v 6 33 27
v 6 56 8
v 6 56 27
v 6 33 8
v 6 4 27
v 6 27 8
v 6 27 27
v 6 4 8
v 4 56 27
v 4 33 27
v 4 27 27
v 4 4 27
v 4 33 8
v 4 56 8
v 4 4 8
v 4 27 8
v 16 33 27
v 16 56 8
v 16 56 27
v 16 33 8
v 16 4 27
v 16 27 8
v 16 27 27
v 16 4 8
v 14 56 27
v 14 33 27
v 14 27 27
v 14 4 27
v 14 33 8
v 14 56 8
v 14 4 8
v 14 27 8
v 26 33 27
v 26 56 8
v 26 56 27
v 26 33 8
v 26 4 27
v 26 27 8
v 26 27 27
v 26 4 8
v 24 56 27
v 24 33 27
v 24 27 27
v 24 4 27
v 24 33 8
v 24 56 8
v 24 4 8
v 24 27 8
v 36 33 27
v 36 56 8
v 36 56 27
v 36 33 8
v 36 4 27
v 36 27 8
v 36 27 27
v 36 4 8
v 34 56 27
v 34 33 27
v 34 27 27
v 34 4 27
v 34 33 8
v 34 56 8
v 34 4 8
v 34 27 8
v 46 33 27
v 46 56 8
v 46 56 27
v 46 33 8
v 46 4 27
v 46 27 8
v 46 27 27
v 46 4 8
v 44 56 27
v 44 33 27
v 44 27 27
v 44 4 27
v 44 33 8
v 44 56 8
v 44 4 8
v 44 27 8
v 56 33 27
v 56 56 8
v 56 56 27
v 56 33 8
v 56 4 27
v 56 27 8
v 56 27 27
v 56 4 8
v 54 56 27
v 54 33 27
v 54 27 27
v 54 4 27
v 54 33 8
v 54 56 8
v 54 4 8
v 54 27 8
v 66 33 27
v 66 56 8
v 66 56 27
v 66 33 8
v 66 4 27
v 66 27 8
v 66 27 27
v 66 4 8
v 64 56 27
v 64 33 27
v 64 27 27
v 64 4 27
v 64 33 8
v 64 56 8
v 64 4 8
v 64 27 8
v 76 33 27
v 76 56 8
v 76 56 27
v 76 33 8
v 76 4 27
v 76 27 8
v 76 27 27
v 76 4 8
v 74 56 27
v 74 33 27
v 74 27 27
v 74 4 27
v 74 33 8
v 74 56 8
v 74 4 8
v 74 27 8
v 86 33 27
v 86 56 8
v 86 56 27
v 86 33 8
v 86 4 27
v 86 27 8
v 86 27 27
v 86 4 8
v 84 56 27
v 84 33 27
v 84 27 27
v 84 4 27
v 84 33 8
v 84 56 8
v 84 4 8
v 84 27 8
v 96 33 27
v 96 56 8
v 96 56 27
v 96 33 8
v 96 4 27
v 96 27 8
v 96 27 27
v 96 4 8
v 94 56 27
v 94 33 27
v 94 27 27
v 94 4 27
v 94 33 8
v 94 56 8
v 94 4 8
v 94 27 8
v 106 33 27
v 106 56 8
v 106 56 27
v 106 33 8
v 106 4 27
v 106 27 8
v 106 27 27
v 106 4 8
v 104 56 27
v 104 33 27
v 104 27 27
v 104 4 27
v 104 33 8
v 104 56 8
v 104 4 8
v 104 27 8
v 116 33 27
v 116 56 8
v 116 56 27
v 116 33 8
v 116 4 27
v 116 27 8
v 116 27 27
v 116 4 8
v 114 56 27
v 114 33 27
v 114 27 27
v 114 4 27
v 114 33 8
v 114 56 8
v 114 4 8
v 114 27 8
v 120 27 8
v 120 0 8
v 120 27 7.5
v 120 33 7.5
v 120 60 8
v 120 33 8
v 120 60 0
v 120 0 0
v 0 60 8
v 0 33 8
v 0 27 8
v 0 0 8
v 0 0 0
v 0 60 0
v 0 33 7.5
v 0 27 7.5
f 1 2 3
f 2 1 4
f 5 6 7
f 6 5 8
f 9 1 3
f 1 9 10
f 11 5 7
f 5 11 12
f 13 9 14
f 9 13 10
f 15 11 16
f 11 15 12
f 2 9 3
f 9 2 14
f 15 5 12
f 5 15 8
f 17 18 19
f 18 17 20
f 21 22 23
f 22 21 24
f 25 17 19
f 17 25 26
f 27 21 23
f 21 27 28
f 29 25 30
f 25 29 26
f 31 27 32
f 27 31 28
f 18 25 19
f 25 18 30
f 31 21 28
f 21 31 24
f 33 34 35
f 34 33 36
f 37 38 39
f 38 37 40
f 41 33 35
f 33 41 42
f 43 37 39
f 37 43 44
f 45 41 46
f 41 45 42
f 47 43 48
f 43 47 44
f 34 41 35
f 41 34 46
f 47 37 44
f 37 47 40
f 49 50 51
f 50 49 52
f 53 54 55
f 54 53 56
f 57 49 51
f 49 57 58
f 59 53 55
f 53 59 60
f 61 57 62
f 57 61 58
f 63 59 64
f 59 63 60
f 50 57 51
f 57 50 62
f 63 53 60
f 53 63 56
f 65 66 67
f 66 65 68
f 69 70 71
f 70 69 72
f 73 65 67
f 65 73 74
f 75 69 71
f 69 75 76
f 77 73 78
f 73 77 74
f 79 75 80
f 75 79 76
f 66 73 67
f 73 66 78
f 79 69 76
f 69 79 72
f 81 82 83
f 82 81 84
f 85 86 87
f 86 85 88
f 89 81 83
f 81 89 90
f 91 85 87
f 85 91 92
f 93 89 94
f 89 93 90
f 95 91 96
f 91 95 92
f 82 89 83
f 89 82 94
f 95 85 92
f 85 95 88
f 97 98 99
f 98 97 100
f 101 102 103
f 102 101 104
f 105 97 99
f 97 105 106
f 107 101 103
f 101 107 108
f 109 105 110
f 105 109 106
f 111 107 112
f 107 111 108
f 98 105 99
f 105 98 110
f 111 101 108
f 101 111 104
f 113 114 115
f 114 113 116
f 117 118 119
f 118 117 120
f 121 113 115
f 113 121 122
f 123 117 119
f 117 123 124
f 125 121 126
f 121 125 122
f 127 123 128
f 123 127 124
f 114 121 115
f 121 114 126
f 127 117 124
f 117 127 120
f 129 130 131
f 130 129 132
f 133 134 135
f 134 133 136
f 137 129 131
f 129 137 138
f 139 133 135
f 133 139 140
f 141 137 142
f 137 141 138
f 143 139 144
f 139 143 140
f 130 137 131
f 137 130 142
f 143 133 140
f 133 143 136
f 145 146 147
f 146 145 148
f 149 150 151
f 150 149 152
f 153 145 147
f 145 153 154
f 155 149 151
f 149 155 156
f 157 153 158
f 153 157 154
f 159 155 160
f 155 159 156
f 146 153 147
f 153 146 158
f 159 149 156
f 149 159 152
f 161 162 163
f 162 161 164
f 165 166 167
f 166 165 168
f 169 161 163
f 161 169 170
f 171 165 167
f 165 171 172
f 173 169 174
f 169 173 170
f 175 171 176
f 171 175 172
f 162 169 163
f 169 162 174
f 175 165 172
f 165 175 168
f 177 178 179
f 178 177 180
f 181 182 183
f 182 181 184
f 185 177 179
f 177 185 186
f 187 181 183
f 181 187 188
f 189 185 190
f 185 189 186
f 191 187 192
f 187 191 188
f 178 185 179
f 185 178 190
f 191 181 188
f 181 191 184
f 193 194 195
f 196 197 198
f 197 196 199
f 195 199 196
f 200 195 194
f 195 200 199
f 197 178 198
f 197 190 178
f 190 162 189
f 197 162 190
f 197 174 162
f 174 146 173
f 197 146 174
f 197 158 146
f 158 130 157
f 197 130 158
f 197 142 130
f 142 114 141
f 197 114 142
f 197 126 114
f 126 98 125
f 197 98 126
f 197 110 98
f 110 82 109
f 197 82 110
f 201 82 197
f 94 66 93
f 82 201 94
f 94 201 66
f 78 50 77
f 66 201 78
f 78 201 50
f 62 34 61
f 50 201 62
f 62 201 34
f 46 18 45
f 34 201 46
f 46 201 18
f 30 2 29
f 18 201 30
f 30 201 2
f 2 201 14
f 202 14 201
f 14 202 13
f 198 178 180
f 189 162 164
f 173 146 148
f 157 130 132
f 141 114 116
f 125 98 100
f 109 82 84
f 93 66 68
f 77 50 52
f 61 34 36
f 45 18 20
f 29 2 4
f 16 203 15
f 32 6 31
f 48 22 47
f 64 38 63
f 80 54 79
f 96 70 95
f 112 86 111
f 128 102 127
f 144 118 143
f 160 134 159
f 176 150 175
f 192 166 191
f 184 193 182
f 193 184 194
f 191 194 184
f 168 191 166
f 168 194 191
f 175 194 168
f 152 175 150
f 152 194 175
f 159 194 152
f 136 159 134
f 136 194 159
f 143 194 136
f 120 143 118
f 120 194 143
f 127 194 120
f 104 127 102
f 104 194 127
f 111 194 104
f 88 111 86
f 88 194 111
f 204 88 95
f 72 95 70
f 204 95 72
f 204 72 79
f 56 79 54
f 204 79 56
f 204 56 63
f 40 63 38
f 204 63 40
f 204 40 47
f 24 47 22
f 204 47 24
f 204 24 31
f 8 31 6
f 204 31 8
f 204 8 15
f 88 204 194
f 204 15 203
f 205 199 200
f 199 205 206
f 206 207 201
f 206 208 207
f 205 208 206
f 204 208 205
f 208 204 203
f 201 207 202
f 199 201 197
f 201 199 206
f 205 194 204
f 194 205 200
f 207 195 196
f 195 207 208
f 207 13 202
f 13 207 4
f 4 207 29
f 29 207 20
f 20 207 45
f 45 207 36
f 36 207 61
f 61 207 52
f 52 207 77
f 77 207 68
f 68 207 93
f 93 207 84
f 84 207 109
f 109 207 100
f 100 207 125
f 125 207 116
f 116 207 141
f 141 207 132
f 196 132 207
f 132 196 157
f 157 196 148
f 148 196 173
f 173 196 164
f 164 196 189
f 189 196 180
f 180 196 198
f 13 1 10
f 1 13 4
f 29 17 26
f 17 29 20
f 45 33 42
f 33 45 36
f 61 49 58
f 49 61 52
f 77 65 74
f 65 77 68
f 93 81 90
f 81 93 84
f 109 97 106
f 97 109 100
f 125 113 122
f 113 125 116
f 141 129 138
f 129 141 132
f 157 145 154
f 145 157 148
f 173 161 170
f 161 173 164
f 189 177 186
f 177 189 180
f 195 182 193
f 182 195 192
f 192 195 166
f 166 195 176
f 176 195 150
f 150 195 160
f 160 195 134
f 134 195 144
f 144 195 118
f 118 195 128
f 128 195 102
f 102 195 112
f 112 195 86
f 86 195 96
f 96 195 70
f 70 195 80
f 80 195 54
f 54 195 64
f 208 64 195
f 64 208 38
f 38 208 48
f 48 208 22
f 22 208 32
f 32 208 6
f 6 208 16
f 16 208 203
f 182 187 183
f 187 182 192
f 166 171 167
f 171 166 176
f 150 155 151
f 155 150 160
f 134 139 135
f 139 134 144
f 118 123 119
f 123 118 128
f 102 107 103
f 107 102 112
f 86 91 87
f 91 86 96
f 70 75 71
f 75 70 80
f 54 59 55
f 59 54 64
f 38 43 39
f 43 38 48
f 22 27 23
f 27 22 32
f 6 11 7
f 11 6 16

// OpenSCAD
$fn = 32;

// ----------------------------------------------------------------------
// Heatsink: slotted fin block
// ----------------------------------------------------------------------

// --- parameters (mm) ---
base_l = 120;             // base length, X
base_w = 60;              // base width, Y
base_t = 8;               // base plate thickness
fin_h = 20;               // fin height above the base
fin_t = 2;                // fin thickness
edge = 4;                 // margin from the base ends
pitch = 10;               // fin pitch
slot_w = 6;               // central slot width, Y

n_fins = floor((base_l - 2 * edge - fin_t) / pitch) + 1;  // fin count
total_h = base_t + fin_h - 1;  // overall height

difference() {
union() {
  cube([base_l, base_w, base_t]);
  for (i = [0 : n_fins - 1])
    translate([edge + i * pitch, edge, base_t - 1])
      cube([fin_t, base_w - 2 * edge, fin_h]);
}
  translate([-1, base_w / 2 - slot_w / 2, base_t - 0.5])
    cube([base_l + 2, slot_w, fin_h + 2]);
}
